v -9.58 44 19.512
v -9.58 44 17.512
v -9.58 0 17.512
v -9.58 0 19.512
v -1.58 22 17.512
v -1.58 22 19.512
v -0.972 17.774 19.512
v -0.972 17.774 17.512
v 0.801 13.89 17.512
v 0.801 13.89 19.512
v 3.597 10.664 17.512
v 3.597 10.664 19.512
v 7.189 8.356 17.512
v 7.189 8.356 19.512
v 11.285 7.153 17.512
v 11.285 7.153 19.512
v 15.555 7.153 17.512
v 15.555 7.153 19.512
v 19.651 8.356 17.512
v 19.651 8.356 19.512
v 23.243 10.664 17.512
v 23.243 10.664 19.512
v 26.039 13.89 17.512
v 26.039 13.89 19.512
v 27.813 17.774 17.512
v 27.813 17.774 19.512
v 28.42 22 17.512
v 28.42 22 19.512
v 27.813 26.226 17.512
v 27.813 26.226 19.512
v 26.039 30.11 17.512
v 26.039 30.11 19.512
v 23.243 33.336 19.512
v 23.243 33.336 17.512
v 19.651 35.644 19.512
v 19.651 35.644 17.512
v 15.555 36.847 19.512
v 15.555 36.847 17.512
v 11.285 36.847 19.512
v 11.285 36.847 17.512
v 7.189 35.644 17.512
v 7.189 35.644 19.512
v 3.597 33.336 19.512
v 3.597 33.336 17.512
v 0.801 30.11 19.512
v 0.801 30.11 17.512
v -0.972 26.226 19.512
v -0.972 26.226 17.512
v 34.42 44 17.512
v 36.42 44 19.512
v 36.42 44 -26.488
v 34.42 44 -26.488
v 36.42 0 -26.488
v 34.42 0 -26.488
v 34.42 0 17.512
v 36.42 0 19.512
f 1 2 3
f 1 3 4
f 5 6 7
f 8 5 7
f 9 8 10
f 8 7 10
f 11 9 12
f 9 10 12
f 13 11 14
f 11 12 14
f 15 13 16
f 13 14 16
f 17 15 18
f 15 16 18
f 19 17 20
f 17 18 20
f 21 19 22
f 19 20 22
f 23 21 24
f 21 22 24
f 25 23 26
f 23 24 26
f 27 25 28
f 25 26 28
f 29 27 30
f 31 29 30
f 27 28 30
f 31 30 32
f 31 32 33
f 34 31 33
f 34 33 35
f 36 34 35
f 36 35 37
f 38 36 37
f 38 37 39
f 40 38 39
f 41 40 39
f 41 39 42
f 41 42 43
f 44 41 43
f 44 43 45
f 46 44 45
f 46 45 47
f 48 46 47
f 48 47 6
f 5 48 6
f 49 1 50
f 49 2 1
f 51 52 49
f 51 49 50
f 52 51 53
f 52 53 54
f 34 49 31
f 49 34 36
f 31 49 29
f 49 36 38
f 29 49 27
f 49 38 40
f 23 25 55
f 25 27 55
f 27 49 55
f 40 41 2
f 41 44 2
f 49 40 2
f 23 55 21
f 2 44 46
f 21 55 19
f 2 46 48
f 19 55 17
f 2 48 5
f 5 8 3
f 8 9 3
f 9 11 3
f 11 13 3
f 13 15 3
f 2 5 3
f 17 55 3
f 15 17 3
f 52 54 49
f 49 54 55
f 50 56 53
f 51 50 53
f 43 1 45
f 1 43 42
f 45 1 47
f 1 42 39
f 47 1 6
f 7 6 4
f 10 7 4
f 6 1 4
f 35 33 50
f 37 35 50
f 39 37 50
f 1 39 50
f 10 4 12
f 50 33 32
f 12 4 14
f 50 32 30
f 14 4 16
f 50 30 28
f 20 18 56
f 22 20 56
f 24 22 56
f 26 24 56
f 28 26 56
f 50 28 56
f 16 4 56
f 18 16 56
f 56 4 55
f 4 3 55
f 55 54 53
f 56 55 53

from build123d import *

# Parameters (mm, degrees)
BOSS_EXTRUDE1_DEPTH = 44
CUT_EXTRUDE1_DEPTH  = 44


with BuildPart() as part:
    # Sketch1 → Boss-Extrude1 (new body)
    with BuildSketch(Plane(origin=(0, 0, 0), x_dir=(1, 0, 0), z_dir=(0, 1, 0))):
        Polygon((-9.579875479, -19.511993177), (36.420124521, -19.511993177), (36.420124521, 26.488006823), (34.420124521, 26.488006823), (34.420124521, -17.511993177), (-9.579875479, -17.511993177), align=None)
    extrude(amount=BOSS_EXTRUDE1_DEPTH)

    # Sketch2 → Cut-Extrude1 (cut)
    with BuildSketch(Plane.XY.offset(19.511993177)):
        with BuildLine():
            ThreePointArc((28.420124521, 22), (13.420124521, 37), (-1.579875479, 22))
            Line((-1.579875479, 22), (28.420124521, 22))
        make_face()
        with BuildLine():
            Line((28.420124521, 22), (-1.579875479, 22))
            ThreePointArc((-1.579875479, 22), (13.420124521, 7), (28.420124521, 22))
        make_face()
    extrude(amount=-CUT_EXTRUDE1_DEPTH, mode=Mode.SUBTRACT)


solid = part.part
